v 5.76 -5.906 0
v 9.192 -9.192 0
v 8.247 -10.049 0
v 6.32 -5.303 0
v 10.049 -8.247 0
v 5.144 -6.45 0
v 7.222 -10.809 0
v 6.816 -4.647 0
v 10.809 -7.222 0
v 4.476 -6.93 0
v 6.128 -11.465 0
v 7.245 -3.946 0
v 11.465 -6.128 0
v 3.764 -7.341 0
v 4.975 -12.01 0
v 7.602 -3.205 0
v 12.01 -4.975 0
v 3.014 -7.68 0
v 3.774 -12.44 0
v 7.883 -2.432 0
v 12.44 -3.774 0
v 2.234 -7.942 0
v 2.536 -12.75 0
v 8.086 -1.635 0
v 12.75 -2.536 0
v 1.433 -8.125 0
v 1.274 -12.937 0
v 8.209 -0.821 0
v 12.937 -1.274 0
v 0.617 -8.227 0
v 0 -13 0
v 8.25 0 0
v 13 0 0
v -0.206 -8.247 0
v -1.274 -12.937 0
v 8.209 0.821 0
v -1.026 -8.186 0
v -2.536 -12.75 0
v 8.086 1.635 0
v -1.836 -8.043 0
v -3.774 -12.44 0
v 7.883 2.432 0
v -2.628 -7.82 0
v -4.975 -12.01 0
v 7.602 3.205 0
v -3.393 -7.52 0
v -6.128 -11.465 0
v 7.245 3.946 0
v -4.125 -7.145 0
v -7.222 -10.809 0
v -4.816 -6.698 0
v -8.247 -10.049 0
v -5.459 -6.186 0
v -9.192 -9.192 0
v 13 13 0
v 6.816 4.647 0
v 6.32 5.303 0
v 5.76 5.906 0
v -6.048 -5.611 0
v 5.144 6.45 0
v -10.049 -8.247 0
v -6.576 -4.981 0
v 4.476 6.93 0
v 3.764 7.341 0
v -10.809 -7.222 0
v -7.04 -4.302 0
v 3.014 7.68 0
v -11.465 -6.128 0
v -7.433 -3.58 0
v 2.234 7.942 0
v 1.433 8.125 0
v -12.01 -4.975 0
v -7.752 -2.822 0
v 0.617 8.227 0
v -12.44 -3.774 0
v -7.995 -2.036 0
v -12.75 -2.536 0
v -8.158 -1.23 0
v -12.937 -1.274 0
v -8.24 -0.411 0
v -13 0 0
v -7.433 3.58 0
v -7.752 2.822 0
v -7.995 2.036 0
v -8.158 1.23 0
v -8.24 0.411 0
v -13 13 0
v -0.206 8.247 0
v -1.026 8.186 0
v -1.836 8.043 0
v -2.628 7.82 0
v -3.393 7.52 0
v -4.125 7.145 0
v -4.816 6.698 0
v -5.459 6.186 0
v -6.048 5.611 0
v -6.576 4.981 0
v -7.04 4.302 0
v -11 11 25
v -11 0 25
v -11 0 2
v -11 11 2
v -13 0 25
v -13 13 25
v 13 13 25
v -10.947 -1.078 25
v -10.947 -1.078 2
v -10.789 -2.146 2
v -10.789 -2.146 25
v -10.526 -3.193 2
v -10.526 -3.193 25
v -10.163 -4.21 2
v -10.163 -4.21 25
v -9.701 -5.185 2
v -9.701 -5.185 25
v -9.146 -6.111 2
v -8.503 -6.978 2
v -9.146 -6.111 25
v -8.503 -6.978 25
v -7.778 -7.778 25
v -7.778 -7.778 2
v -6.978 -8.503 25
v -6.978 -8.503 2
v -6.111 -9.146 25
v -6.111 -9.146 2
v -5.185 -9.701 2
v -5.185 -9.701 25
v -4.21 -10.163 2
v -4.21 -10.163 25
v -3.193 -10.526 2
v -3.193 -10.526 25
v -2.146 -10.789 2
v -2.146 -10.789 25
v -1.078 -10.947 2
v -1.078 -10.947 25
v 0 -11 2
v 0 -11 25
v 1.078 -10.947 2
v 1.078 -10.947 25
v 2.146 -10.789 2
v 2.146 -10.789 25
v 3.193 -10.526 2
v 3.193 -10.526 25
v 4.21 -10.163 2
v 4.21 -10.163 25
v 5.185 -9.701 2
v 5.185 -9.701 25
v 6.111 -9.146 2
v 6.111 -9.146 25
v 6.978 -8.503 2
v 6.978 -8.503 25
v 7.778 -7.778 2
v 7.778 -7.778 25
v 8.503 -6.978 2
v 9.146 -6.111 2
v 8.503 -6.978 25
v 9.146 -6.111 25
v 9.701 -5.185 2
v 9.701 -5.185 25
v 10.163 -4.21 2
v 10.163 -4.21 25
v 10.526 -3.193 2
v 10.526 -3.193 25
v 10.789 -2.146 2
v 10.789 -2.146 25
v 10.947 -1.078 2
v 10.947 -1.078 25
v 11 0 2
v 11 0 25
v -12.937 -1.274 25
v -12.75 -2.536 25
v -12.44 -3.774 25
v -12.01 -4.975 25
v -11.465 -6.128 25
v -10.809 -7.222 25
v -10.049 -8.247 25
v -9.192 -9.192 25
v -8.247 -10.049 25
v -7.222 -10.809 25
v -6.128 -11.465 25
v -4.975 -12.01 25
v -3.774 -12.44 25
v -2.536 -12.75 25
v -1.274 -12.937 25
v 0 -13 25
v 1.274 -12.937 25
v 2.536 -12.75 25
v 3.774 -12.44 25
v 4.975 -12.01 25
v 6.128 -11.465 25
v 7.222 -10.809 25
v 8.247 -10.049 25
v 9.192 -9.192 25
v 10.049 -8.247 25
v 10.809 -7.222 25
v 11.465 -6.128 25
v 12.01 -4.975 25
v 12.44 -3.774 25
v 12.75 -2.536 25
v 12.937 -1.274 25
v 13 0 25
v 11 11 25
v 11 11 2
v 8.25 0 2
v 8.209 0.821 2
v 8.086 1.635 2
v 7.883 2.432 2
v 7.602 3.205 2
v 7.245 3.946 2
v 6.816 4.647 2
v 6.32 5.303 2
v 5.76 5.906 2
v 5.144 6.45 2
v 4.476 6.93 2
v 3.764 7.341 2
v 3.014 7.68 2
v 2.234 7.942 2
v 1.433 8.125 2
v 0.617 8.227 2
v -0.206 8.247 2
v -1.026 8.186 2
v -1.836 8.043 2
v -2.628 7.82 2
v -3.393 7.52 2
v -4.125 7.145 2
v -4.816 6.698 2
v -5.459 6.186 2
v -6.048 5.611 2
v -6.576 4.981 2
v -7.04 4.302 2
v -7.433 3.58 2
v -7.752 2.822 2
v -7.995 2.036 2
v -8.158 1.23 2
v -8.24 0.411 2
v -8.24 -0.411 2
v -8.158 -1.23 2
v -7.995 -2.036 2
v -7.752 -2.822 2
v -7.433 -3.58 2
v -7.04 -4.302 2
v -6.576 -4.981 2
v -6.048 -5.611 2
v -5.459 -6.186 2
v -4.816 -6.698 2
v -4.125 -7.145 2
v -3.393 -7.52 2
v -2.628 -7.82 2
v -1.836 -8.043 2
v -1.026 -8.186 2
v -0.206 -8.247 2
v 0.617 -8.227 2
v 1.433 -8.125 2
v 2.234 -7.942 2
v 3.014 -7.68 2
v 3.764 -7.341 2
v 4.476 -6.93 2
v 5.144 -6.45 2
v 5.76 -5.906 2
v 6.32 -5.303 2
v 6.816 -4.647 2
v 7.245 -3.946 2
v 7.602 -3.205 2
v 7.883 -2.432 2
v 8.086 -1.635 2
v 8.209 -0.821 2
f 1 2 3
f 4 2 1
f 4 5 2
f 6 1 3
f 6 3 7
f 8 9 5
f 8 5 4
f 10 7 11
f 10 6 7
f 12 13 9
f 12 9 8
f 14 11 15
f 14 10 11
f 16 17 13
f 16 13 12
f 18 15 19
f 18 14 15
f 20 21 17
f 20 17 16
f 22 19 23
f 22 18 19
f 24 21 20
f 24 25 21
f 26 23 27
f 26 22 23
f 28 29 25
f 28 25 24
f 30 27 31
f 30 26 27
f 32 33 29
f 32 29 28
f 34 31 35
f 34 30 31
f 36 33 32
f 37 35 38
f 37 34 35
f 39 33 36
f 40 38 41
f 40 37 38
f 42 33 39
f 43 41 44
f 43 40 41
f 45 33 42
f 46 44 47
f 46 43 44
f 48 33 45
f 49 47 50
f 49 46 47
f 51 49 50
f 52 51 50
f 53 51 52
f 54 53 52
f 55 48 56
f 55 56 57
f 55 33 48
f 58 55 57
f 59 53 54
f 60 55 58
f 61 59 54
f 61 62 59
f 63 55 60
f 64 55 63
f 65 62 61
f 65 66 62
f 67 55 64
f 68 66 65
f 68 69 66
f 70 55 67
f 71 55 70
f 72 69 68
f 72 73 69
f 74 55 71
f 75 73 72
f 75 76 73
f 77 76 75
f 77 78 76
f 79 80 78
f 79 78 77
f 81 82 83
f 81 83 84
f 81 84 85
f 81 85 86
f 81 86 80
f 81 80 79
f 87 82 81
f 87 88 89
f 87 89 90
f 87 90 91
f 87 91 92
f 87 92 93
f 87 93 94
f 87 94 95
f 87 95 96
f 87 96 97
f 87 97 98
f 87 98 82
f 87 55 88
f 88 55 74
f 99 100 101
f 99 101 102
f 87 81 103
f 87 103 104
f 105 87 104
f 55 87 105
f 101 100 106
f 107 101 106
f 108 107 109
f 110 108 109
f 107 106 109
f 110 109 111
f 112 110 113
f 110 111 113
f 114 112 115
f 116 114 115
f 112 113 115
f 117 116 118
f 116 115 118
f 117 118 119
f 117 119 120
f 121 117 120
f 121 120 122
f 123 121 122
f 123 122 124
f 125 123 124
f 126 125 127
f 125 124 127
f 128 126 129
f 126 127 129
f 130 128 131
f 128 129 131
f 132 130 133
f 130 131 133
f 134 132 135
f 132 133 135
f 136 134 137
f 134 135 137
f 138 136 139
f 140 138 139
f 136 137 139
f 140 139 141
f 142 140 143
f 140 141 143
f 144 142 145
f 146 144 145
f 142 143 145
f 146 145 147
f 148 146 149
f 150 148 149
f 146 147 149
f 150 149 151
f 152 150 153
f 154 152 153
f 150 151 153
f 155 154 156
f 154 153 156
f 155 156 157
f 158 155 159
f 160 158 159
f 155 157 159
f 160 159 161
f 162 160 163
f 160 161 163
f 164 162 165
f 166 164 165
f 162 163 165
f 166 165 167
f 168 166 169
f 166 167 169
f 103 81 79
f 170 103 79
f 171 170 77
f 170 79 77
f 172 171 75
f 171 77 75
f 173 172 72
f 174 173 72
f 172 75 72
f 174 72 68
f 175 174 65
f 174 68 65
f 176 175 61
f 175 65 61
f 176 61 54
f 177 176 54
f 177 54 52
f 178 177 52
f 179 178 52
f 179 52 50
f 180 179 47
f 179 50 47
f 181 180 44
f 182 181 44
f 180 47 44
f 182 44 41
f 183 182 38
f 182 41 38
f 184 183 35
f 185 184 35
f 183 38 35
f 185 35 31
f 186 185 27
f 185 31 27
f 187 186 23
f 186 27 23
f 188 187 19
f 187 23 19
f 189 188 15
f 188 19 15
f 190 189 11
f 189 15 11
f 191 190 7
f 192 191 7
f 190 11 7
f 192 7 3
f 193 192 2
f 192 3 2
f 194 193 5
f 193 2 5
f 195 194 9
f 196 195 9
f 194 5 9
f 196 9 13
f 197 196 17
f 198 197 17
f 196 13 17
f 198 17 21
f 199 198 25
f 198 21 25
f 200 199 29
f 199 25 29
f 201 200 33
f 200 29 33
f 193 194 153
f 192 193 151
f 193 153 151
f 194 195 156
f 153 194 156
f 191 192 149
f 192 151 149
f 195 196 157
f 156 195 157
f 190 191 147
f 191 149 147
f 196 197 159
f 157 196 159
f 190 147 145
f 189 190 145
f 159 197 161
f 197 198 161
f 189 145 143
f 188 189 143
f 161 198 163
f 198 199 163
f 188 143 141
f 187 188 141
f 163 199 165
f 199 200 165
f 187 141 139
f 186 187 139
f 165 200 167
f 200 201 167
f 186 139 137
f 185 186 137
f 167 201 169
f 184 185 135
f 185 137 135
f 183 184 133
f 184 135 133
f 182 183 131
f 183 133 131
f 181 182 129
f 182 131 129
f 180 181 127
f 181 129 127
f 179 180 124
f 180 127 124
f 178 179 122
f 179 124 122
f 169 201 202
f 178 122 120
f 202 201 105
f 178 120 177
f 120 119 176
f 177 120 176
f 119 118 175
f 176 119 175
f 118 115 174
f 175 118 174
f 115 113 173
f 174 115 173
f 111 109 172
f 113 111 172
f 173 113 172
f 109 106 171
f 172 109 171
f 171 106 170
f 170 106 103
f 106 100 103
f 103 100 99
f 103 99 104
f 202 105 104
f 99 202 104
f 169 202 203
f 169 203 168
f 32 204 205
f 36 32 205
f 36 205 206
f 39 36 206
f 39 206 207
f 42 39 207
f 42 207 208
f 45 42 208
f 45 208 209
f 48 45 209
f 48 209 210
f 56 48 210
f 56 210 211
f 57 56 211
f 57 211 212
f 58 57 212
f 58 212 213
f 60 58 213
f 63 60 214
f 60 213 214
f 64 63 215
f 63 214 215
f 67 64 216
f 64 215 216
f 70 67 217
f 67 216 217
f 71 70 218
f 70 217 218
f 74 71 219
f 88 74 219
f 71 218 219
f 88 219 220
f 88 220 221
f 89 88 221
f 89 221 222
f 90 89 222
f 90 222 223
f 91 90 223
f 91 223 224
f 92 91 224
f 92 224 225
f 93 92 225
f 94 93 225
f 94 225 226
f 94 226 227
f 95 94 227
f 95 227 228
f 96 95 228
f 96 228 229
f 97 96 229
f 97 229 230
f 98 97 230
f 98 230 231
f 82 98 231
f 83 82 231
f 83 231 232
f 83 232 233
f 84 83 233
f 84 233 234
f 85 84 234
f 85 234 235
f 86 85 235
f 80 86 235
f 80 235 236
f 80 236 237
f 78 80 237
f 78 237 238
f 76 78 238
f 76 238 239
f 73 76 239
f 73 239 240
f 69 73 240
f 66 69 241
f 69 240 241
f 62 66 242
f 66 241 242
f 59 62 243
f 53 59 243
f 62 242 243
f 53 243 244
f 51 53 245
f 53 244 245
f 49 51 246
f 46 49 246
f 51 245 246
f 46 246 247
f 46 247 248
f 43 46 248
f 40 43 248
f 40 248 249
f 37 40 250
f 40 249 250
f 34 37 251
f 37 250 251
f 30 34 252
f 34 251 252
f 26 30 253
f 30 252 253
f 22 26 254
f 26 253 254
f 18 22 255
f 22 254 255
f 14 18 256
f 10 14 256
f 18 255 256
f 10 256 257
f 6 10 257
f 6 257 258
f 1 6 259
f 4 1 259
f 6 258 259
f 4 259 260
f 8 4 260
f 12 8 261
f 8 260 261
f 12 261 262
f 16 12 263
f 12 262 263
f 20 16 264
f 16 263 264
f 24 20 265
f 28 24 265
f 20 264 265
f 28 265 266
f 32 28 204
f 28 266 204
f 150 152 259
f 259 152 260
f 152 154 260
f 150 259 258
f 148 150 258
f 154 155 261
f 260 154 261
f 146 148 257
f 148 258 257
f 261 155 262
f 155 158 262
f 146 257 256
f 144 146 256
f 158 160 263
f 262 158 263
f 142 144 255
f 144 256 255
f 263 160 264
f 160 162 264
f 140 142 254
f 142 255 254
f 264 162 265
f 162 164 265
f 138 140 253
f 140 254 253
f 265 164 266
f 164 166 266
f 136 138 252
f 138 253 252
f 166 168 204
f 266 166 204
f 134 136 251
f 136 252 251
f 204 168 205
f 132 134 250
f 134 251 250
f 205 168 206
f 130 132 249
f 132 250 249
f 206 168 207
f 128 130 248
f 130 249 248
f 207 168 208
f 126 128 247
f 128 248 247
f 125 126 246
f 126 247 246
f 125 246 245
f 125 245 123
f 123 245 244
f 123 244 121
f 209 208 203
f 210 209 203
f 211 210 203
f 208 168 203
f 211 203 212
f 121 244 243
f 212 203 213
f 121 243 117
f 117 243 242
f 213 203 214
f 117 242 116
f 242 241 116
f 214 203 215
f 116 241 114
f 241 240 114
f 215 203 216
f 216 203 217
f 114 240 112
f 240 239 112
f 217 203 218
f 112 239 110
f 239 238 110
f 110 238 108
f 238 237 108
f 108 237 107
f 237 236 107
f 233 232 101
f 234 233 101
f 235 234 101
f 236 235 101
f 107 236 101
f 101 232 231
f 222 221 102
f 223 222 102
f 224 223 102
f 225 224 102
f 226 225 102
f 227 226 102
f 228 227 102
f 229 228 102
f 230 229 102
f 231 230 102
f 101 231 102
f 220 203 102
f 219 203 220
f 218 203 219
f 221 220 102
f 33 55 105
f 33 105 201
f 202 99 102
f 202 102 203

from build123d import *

# Parameters (mm, degrees)
PAD_DEPTH       = 25
POCKET_DEPTH    = 23
SKETCH002_R     = 8.25
POCKET001_DEPTH = 25


with BuildPart() as part:
    # Sketch → Pad (new body)
    with BuildSketch(Plane.XY):
        with BuildLine():
            Line((-13, 0), (-13, 13))
            Line((-13, 13), (13, 13))
            Line((13, 13), (13, 0))
            ThreePointArc((-13, 0), (0, -13), (13, 0))
        make_face()
    extrude(amount=PAD_DEPTH)

    # Sketch001 (on DatumPlane) → Pocket (cut)
    with BuildSketch(Plane.XY.offset(25)):
        with BuildLine():
            Line((-11, 0), (-11, 11))
            Line((-11, 11), (11, 11))
            Line((11, 11), (11, 0))
            ThreePointArc((-11, 0), (0, -11), (11, 0))
        make_face()
    extrude(amount=-POCKET_DEPTH, mode=Mode.SUBTRACT)

    # Sketch002 (on DatumPlane) → Pocket001 (cut)
    with BuildSketch(Plane.XY.offset(25)):
        Circle(SKETCH002_R)
    extrude(amount=-POCKET001_DEPTH, mode=Mode.SUBTRACT)


solid = part.part
